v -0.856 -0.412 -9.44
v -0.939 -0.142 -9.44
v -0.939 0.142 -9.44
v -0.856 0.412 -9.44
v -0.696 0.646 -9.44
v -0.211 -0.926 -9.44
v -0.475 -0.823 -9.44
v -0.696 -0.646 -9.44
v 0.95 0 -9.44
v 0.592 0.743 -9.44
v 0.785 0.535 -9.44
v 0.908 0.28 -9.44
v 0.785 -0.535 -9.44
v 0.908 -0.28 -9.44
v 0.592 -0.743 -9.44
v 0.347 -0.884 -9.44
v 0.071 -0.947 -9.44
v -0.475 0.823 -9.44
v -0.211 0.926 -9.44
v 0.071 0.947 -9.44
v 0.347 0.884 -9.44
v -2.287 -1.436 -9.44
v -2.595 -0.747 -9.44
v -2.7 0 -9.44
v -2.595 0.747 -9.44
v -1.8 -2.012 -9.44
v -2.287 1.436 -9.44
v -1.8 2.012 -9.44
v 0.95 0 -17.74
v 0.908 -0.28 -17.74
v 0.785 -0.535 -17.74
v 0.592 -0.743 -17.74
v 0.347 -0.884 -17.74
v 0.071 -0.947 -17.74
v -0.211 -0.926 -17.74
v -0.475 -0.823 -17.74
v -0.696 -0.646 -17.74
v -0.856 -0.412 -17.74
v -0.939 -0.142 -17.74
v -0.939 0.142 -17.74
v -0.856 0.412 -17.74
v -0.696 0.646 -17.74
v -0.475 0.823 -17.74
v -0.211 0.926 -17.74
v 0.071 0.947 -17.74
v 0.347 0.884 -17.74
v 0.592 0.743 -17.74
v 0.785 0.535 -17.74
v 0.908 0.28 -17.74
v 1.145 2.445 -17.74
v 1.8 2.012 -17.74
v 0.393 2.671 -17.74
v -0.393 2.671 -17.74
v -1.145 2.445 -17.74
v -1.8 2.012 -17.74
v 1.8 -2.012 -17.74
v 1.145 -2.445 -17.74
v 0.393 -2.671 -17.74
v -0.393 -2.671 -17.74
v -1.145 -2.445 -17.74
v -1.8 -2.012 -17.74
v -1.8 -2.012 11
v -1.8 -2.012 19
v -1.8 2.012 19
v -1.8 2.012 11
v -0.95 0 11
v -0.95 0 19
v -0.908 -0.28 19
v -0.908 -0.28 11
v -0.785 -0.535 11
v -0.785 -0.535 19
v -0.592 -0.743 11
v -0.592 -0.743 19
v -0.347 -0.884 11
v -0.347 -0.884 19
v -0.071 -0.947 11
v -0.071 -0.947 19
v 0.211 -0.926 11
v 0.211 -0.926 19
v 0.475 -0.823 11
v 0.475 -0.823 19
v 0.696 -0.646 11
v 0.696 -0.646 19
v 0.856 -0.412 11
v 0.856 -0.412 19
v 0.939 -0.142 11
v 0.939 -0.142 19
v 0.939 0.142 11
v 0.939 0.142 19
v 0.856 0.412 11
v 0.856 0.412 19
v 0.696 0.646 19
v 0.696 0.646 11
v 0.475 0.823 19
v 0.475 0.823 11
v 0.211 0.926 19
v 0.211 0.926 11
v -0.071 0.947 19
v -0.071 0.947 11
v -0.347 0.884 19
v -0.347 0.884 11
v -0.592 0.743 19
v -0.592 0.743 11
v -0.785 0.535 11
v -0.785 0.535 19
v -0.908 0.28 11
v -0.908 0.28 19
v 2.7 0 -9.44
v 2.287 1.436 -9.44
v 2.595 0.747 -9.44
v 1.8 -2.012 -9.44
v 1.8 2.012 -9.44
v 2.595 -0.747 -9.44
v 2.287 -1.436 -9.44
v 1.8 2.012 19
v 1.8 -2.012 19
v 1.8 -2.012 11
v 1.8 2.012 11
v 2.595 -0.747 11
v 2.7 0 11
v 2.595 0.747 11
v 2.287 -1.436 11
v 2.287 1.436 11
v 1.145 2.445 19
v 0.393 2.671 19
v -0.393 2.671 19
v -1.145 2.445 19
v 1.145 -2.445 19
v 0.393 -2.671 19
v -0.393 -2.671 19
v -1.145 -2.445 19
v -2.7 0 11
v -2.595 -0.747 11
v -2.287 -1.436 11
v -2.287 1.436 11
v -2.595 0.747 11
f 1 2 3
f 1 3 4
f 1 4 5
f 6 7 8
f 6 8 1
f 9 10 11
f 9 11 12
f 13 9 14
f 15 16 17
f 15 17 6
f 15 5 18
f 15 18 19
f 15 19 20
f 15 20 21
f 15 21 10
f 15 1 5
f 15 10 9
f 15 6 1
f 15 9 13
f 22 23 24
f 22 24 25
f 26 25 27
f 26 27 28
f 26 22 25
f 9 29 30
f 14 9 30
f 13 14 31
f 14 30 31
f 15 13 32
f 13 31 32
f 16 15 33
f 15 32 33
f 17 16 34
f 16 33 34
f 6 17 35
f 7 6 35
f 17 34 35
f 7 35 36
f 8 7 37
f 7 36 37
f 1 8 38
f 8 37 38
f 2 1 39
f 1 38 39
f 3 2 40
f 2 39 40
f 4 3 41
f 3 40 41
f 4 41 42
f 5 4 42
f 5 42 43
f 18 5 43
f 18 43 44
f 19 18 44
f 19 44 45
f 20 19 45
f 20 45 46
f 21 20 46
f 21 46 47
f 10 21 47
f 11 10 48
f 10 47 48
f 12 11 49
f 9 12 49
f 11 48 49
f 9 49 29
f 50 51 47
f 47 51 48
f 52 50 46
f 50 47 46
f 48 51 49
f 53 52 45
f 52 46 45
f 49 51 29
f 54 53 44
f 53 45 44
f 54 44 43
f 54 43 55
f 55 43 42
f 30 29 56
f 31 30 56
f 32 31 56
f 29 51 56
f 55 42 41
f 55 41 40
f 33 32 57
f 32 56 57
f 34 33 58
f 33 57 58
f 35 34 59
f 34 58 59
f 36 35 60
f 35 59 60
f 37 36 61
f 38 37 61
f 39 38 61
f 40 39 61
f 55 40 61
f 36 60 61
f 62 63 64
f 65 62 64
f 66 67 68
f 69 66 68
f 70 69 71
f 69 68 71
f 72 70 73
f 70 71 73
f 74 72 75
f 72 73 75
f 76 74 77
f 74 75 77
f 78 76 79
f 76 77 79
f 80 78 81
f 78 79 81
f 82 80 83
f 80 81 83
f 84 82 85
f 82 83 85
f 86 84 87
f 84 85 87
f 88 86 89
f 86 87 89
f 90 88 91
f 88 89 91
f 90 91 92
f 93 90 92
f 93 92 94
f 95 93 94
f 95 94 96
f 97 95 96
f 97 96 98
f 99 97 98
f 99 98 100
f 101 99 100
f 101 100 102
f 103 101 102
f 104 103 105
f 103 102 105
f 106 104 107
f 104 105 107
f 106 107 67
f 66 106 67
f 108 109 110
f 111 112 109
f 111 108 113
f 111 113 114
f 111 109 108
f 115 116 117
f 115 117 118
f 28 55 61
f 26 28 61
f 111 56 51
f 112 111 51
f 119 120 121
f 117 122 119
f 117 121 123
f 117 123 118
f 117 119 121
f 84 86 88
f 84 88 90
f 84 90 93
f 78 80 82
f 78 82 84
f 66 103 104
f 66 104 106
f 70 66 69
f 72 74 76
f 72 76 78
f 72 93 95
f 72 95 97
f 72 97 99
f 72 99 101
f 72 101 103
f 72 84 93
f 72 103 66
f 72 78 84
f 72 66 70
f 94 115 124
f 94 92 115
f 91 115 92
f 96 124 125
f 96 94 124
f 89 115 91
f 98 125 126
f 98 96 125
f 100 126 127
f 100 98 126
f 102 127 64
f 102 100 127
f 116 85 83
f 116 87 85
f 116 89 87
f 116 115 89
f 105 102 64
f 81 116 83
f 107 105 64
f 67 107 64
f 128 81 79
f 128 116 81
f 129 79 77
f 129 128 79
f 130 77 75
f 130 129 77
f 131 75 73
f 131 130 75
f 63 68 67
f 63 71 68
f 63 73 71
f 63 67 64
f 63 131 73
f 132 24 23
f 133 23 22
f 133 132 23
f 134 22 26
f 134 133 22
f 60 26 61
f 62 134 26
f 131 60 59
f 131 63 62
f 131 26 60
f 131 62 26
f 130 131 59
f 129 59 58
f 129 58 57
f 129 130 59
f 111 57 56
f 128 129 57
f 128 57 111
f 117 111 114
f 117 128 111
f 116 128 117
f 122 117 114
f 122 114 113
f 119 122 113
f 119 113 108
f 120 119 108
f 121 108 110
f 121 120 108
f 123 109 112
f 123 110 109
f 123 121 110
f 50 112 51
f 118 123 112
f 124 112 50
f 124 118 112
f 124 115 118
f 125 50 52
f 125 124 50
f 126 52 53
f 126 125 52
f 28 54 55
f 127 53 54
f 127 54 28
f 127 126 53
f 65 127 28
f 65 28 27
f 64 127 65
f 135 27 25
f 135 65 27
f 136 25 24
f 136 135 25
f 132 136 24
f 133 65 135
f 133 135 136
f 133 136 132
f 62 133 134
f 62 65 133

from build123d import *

# Parameters (mm, degrees)
SKETCH052_R     = 2.7
PAD038_DEPTH    = 19
PAD039_DEPTH    = 17.74
SKETCH053_R     = 0.95
POCKET009_DEPTH = 8.3
SKETCH081_R     = 0.95
POCKET025_DEPTH = 8


with BuildPart() as part:
    # Sketch052 (on ShapeBinder) → Pad038 (new body)
    with BuildSketch(Plane(origin=(0, 0, 0), x_dir=(-1, 0, 0), z_dir=(0, 0, 1))):
        with Locations((0, 37.1)):
            Circle(SKETCH052_R)
    extrude(amount=PAD038_DEPTH)

    # Sketch052 (on ShapeBinder) → Pad039 (join)
    with BuildSketch(Plane(origin=(0, 0, 0), x_dir=(-1, 0, 0), z_dir=(0, 0, 1))):
        with Locations((0, 37.1)):
            Circle(SKETCH052_R)
    extrude(amount=-PAD039_DEPTH)

    # Sketch053 (on Face1 of Pad039) → Pocket009 (cut)
    with BuildSketch(Plane(origin=(0, 0, -17.74), x_dir=(1, 0, 0), z_dir=(0, 0, -1))):
        with Locations((0, 37.1)):
            Circle(SKETCH053_R)
        with BuildLine():
            Line((-1.8, 35.0875388203), (-1.8, 39.1124611797))
            ThreePointArc((-1.8, 39.1124611797), (-2.7, 37.1), (-1.8, 35.0875388203))
        make_face()
        with BuildLine():
            Line((1.8, 39.1124611797), (1.8, 35.0875388203))
            ThreePointArc((1.8, 35.0875388203), (2.7, 37.1), (1.8, 39.1124611797))
        make_face()
    extrude(amount=-POCKET009_DEPTH, mode=Mode.SUBTRACT)

    # Sketch081 (on Face8 of Pocket009) → Pocket025 (cut)
    with BuildSketch(Plane(origin=(0, 0, 19), x_dir=(-1, 0, 0), z_dir=(0, 0, 1))):
        with Locations((0, 37.1)):
            Circle(SKETCH081_R)
        with BuildLine():
            ThreePointArc((-1.8, 39.1124611797), (-2.7, 37.1), (-1.8, 35.0875388203))
            Line((-1.8, 39.1124611797), (-1.8, 35.0875388203))
        make_face()
        with BuildLine():
            Line((1.8, 39.1124611797), (1.8, 35.0875388203))
            ThreePointArc((1.8, 35.0875388203), (2.7, 37.1), (1.8, 39.1124611797))
        make_face()
    extrude(amount=-POCKET025_DEPTH, mode=Mode.SUBTRACT)


with BuildPart() as part_1:
    # Body024 placement: moved
    add(part.part.moved(Location((0, 37.1, 0))))


solid = part_1.part
